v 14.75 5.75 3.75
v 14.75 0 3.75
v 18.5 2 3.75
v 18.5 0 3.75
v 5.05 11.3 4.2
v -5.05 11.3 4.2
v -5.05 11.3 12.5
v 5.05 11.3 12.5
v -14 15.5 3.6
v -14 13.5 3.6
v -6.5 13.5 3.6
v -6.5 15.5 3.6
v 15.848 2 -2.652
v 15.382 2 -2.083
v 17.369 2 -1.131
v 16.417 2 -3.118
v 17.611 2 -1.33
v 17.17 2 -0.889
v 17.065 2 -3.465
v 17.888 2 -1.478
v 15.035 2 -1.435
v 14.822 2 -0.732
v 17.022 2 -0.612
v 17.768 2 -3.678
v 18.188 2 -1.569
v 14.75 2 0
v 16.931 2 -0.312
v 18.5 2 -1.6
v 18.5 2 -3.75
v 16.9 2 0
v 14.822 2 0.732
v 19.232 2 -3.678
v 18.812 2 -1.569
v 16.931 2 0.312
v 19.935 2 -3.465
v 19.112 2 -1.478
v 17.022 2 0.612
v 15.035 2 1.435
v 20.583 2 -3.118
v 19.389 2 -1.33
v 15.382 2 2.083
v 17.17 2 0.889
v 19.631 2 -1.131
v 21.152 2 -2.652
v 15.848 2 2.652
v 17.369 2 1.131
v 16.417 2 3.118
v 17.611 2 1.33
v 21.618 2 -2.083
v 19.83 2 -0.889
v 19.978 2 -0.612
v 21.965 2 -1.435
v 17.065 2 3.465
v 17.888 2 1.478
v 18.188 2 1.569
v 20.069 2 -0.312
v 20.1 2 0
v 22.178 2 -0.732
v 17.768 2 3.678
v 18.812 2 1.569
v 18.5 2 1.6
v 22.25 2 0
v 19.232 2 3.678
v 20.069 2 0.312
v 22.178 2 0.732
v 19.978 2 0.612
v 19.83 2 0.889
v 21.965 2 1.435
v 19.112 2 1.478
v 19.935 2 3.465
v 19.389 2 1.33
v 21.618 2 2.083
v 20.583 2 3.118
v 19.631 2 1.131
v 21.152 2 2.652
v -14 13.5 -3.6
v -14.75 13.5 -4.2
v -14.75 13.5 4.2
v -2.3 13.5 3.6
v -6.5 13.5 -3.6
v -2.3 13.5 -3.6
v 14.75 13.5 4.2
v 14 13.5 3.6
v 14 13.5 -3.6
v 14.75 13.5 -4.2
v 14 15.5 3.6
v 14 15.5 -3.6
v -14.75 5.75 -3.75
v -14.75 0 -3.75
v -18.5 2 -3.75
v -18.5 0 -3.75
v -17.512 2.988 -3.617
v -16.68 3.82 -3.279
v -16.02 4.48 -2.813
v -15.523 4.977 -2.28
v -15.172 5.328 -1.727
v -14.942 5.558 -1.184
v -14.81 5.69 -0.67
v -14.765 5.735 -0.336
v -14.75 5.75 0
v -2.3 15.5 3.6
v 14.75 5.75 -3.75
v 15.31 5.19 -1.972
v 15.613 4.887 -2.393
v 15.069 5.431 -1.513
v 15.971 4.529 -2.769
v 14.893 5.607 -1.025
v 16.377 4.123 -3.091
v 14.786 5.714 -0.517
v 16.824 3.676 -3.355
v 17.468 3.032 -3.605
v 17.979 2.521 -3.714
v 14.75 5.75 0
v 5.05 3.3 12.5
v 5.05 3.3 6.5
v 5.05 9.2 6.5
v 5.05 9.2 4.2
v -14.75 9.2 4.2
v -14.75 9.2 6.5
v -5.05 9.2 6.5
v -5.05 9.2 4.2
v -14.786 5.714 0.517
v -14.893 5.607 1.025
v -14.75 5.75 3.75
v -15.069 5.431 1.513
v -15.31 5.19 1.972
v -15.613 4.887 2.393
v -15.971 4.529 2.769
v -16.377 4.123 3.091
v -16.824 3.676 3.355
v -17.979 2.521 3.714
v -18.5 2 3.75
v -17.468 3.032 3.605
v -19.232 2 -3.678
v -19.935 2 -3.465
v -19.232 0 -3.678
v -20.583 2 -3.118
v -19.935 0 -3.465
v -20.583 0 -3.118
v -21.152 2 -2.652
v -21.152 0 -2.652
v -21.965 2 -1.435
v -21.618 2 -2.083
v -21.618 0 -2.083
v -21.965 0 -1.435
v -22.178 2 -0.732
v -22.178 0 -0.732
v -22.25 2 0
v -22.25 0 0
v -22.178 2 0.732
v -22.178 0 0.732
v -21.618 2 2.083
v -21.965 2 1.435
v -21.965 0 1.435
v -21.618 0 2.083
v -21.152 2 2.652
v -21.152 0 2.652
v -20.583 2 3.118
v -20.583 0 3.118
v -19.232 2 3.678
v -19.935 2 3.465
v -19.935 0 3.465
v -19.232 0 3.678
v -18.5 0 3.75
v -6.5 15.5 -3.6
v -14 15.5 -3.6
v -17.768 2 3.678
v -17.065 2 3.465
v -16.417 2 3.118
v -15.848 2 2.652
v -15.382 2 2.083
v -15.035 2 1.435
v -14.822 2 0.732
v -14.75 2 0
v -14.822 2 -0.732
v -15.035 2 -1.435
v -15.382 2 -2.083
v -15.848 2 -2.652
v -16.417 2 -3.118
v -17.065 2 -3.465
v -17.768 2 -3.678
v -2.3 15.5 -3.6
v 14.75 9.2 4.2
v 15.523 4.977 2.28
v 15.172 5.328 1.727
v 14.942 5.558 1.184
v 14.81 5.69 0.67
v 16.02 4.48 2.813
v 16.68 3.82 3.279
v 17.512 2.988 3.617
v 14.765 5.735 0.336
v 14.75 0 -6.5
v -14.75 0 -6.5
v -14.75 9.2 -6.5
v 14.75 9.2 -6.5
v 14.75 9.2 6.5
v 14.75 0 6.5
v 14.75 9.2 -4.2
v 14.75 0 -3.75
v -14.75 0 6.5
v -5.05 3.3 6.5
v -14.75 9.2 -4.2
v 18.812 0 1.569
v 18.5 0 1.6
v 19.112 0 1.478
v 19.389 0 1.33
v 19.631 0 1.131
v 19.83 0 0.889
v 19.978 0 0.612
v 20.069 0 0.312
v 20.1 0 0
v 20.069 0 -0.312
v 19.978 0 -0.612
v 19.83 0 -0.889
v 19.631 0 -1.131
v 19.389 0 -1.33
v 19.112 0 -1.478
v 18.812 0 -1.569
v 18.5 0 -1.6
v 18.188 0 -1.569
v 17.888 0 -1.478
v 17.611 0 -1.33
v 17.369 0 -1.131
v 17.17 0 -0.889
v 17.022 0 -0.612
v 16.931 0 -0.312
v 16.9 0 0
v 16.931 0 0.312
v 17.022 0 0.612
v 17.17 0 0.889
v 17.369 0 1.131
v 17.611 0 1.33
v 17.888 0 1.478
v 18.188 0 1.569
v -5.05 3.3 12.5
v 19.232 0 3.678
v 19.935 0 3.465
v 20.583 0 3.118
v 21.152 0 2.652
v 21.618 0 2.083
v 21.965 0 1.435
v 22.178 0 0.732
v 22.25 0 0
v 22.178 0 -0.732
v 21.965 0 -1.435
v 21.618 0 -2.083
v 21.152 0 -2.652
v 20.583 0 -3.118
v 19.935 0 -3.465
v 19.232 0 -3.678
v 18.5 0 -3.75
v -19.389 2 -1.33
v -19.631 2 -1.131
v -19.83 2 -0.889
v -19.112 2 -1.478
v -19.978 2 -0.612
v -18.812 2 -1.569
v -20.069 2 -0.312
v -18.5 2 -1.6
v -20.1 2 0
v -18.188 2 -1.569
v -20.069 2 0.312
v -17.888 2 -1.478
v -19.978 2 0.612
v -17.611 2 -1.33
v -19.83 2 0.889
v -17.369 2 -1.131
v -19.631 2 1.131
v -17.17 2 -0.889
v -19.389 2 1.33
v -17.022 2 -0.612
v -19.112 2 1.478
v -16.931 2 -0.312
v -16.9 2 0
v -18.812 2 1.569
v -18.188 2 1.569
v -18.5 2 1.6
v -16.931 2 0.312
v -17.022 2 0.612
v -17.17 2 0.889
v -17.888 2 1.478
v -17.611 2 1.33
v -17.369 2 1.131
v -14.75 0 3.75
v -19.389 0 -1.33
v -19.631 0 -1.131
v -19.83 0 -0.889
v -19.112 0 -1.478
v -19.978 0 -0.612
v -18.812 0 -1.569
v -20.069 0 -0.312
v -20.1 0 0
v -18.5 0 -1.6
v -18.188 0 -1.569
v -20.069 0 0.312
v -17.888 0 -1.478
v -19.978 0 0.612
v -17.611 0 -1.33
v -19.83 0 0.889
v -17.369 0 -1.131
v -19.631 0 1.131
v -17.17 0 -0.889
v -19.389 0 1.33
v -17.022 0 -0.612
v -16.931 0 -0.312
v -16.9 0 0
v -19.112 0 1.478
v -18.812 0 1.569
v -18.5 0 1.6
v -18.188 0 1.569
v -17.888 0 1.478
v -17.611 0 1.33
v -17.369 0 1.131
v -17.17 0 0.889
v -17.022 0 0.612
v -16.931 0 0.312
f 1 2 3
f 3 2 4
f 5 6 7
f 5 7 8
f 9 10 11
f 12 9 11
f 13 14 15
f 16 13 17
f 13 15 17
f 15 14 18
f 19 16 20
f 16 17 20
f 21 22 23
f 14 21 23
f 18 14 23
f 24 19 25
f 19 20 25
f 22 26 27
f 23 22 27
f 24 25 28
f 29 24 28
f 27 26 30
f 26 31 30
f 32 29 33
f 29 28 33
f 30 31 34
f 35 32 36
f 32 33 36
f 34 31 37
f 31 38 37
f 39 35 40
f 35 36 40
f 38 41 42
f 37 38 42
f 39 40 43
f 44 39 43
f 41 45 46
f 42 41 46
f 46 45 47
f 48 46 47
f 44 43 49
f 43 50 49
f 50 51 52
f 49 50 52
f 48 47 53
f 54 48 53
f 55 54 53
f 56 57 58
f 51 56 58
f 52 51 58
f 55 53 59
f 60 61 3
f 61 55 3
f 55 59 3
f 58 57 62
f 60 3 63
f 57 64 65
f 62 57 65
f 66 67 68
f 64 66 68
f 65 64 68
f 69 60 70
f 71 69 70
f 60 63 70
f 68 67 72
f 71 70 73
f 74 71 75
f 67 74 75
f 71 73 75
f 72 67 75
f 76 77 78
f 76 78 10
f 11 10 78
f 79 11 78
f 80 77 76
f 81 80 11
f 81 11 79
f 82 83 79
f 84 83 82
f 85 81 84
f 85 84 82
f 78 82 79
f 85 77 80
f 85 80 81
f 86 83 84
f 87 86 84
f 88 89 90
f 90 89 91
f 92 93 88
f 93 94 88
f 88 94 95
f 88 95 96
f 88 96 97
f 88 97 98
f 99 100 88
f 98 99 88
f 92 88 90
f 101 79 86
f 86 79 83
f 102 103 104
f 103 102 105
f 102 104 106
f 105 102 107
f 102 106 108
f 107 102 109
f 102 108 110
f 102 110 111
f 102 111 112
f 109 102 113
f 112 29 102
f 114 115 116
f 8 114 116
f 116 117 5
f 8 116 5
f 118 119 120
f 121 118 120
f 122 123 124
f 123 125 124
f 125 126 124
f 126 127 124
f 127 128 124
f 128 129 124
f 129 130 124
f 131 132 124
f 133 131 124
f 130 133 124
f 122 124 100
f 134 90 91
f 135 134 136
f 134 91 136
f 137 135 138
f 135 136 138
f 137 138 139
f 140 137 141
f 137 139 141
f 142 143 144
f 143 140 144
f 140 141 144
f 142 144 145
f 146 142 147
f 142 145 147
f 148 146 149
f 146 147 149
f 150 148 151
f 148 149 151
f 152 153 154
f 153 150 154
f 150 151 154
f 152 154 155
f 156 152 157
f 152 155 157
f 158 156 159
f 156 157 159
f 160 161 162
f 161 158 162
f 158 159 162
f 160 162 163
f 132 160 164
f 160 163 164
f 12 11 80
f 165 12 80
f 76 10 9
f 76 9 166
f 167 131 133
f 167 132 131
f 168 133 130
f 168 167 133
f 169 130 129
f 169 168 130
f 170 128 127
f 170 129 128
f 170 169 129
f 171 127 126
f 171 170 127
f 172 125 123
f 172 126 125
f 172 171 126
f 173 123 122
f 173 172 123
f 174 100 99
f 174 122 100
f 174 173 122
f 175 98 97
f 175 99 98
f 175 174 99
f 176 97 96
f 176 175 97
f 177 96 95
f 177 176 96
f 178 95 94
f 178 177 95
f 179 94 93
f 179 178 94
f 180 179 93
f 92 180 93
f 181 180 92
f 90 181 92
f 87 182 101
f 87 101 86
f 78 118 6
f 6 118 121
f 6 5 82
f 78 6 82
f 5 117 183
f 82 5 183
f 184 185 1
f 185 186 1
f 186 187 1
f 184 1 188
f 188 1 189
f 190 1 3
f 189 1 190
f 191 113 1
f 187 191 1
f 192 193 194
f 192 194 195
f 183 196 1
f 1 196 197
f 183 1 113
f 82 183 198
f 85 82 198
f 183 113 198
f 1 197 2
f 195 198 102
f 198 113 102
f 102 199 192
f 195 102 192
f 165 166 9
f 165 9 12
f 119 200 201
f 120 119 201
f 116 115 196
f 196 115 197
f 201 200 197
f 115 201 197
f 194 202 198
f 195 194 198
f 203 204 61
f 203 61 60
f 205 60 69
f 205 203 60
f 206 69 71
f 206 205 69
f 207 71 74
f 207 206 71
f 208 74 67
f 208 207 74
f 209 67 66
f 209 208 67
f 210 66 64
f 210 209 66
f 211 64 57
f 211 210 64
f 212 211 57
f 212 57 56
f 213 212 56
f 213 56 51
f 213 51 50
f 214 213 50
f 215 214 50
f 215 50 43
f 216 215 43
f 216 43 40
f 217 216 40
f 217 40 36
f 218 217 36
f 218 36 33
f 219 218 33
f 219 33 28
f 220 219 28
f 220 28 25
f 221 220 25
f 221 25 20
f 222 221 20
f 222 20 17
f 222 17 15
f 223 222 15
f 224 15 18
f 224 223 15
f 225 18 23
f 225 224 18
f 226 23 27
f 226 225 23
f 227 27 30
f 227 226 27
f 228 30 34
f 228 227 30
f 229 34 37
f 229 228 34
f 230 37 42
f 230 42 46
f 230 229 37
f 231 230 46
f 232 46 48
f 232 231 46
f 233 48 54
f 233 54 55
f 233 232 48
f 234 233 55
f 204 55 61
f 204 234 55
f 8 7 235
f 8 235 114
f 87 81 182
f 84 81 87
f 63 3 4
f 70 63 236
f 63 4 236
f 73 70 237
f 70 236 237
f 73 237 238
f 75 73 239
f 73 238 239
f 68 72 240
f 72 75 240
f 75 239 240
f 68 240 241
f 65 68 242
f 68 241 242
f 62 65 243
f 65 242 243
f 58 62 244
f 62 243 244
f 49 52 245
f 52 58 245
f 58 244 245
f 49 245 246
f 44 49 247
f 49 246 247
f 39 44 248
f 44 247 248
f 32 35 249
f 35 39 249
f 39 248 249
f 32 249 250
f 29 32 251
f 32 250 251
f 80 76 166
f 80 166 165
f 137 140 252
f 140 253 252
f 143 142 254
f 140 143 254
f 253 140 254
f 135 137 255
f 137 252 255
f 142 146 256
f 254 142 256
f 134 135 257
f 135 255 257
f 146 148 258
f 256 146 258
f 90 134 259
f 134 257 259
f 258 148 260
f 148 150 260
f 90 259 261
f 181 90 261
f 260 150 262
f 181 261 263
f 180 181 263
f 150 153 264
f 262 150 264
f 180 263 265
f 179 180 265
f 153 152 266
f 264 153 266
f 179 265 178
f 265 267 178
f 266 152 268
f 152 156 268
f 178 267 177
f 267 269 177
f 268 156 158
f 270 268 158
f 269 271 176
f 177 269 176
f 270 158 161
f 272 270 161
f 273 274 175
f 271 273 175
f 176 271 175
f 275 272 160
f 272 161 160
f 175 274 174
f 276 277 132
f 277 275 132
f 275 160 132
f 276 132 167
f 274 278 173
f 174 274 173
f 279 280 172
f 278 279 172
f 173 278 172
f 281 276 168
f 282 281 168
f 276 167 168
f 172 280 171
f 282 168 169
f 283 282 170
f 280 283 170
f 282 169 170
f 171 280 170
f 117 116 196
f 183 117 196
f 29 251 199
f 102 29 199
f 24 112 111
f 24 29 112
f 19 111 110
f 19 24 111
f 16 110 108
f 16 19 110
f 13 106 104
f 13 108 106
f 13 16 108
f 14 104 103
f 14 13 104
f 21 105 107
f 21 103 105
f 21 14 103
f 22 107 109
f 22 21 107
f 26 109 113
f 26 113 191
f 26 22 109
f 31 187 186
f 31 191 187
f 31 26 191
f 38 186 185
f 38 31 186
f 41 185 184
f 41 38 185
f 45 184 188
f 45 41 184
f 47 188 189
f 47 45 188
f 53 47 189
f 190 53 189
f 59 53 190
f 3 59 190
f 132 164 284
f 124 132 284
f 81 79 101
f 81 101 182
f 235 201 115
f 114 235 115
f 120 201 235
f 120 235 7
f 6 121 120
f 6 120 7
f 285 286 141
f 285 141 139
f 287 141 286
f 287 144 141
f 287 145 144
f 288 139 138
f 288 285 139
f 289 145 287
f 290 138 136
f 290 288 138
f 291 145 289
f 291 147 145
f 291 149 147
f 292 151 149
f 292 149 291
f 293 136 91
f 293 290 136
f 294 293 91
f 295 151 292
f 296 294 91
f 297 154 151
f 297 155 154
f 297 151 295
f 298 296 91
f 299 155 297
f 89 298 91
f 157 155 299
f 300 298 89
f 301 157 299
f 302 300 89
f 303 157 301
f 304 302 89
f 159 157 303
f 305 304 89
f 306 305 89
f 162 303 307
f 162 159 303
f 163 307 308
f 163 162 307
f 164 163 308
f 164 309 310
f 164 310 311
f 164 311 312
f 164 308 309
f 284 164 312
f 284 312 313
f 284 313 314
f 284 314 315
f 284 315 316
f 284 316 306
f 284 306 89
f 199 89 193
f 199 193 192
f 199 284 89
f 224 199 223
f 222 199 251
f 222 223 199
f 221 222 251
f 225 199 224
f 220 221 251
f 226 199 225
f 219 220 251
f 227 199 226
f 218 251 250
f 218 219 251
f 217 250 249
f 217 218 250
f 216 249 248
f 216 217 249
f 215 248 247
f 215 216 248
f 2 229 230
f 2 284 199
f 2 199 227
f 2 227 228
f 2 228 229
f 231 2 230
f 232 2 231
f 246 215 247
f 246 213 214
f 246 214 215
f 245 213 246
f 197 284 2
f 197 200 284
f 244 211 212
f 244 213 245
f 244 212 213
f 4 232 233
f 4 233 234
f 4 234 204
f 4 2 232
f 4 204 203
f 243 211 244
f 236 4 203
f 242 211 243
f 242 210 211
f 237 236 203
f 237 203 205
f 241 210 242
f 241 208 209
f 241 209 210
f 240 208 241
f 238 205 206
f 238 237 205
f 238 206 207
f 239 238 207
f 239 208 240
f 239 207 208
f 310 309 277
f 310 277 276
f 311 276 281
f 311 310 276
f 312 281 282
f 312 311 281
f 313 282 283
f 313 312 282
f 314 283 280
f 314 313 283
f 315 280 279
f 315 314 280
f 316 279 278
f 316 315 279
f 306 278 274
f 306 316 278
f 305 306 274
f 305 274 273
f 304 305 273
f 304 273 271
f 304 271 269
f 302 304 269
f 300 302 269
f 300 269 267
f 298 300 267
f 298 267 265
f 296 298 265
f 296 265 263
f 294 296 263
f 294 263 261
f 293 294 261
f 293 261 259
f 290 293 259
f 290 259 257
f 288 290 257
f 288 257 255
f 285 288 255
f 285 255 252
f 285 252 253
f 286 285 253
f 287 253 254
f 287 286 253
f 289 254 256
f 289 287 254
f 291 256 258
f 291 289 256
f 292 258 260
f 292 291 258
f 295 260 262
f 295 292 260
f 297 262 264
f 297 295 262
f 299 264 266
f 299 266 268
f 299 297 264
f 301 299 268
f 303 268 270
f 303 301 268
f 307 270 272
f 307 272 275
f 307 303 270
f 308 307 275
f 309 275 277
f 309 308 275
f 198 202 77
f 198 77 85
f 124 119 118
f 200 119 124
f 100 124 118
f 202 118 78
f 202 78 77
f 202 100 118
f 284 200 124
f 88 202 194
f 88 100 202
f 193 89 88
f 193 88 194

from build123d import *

# Parameters (mm, degrees)
SKETCH1_R      = 1.6
EXTRUDE1_DEPTH = 10
EXTRUDE2_DEPTH = 10
SKETCH3_R      = 3.75
EXTRUDE3_DEPTH = 10
SKETCH4_W      = 29.5
SKETCH4_H      = 13
EXTRUDE4_DEPTH = 9.2
SKETCH5_W      = 29.5
SKETCH5_H      = 8.4
EXTRUDE5_DEPTH = 4.3
SKETCH6_W      = 7.5
SKETCH6_H      = 7.2
SKETCH6_W_2    = 16.3
EXTRUDE6_DEPTH = 2
SKETCH7_W      = 10.1
SKETCH7_H      = 8
EXTRUDE7_DEPTH = 12.5


with BuildPart() as part:
    # Sketch1 → Extrude1 (new body)
    with BuildSketch(Plane(origin=(0, 0, 0), x_dir=(1, 0, 0), z_dir=(0, 1, 0))):
        with BuildLine():
            Line((-18.5, -3.75), (18.5, -3.75))
            ThreePointArc((18.5, -3.75), (22.25, 0), (18.5, 3.75))
            Line((18.5, 3.75), (-18.5, 3.75))
            ThreePointArc((-18.5, 3.75), (-22.25, 0), (-18.5, -3.75))
        make_face()
        with Locations(Location((18.5, 0, 0), (0, 0, 270))):
            Circle(SKETCH1_R, mode=Mode.SUBTRACT)
        with Locations(Location((-18.5, 0, 0), (0, 0, 270))):
            Circle(SKETCH1_R, mode=Mode.SUBTRACT)
    extrude(amount=EXTRUDE1_DEPTH)

    # Sketch2 → Extrude2 (cut)
    with BuildSketch(Plane.XY.offset(3.75)):
        Polygon((-22.25, 2), (-18.5, 2), (-10.5, 10), (10.5, 10), (18.5, 2), (22.25, 2), (22.25, 12), (-22.25, 12), align=None)
    extrude(amount=-EXTRUDE2_DEPTH, mode=Mode.SUBTRACT)

    # Sketch3 → Extrude3 (cut)
    with BuildSketch(Plane(origin=(0, 2, 0), x_dir=(1, 0, 0), z_dir=(0, 1, 0))):
        with Locations((-18.5, 0)):
            Circle(SKETCH3_R)
        with Locations((18.5, 0)):
            Circle(SKETCH3_R)
    extrude(amount=EXTRUDE3_DEPTH, mode=Mode.SUBTRACT)

    # Sketch4 → Extrude4 (add)
    with BuildSketch(Plane.XZ):
        Rectangle(SKETCH4_W, SKETCH4_H)
    extrude(amount=-EXTRUDE4_DEPTH)

    # Sketch5 → Extrude5 (add)
    with BuildSketch(Plane(origin=(0, 9.2, 0), x_dir=(1, 0, 0), z_dir=(0, 1, 0))):
        Rectangle(SKETCH5_W, SKETCH5_H)
    extrude(amount=EXTRUDE5_DEPTH)

    # Sketch6 → Extrude6 (add)
    with BuildSketch(Plane(origin=(0, 13.5, 0), x_dir=(1, 0, 0), z_dir=(0, 1, 0))):
        with Locations((-10.25, 0)):
            Rectangle(SKETCH6_W, SKETCH6_H)
        with Locations((5.85, 0)):
            Rectangle(SKETCH6_W_2, SKETCH6_H)
    extrude(amount=EXTRUDE6_DEPTH)

    # Sketch7 → Extrude7 (add)
    with BuildSketch(Plane.XY):
        with Locations((0, 7.3)):
            Rectangle(SKETCH7_W, SKETCH7_H)
    extrude(amount=EXTRUDE7_DEPTH)


solid = part.part
